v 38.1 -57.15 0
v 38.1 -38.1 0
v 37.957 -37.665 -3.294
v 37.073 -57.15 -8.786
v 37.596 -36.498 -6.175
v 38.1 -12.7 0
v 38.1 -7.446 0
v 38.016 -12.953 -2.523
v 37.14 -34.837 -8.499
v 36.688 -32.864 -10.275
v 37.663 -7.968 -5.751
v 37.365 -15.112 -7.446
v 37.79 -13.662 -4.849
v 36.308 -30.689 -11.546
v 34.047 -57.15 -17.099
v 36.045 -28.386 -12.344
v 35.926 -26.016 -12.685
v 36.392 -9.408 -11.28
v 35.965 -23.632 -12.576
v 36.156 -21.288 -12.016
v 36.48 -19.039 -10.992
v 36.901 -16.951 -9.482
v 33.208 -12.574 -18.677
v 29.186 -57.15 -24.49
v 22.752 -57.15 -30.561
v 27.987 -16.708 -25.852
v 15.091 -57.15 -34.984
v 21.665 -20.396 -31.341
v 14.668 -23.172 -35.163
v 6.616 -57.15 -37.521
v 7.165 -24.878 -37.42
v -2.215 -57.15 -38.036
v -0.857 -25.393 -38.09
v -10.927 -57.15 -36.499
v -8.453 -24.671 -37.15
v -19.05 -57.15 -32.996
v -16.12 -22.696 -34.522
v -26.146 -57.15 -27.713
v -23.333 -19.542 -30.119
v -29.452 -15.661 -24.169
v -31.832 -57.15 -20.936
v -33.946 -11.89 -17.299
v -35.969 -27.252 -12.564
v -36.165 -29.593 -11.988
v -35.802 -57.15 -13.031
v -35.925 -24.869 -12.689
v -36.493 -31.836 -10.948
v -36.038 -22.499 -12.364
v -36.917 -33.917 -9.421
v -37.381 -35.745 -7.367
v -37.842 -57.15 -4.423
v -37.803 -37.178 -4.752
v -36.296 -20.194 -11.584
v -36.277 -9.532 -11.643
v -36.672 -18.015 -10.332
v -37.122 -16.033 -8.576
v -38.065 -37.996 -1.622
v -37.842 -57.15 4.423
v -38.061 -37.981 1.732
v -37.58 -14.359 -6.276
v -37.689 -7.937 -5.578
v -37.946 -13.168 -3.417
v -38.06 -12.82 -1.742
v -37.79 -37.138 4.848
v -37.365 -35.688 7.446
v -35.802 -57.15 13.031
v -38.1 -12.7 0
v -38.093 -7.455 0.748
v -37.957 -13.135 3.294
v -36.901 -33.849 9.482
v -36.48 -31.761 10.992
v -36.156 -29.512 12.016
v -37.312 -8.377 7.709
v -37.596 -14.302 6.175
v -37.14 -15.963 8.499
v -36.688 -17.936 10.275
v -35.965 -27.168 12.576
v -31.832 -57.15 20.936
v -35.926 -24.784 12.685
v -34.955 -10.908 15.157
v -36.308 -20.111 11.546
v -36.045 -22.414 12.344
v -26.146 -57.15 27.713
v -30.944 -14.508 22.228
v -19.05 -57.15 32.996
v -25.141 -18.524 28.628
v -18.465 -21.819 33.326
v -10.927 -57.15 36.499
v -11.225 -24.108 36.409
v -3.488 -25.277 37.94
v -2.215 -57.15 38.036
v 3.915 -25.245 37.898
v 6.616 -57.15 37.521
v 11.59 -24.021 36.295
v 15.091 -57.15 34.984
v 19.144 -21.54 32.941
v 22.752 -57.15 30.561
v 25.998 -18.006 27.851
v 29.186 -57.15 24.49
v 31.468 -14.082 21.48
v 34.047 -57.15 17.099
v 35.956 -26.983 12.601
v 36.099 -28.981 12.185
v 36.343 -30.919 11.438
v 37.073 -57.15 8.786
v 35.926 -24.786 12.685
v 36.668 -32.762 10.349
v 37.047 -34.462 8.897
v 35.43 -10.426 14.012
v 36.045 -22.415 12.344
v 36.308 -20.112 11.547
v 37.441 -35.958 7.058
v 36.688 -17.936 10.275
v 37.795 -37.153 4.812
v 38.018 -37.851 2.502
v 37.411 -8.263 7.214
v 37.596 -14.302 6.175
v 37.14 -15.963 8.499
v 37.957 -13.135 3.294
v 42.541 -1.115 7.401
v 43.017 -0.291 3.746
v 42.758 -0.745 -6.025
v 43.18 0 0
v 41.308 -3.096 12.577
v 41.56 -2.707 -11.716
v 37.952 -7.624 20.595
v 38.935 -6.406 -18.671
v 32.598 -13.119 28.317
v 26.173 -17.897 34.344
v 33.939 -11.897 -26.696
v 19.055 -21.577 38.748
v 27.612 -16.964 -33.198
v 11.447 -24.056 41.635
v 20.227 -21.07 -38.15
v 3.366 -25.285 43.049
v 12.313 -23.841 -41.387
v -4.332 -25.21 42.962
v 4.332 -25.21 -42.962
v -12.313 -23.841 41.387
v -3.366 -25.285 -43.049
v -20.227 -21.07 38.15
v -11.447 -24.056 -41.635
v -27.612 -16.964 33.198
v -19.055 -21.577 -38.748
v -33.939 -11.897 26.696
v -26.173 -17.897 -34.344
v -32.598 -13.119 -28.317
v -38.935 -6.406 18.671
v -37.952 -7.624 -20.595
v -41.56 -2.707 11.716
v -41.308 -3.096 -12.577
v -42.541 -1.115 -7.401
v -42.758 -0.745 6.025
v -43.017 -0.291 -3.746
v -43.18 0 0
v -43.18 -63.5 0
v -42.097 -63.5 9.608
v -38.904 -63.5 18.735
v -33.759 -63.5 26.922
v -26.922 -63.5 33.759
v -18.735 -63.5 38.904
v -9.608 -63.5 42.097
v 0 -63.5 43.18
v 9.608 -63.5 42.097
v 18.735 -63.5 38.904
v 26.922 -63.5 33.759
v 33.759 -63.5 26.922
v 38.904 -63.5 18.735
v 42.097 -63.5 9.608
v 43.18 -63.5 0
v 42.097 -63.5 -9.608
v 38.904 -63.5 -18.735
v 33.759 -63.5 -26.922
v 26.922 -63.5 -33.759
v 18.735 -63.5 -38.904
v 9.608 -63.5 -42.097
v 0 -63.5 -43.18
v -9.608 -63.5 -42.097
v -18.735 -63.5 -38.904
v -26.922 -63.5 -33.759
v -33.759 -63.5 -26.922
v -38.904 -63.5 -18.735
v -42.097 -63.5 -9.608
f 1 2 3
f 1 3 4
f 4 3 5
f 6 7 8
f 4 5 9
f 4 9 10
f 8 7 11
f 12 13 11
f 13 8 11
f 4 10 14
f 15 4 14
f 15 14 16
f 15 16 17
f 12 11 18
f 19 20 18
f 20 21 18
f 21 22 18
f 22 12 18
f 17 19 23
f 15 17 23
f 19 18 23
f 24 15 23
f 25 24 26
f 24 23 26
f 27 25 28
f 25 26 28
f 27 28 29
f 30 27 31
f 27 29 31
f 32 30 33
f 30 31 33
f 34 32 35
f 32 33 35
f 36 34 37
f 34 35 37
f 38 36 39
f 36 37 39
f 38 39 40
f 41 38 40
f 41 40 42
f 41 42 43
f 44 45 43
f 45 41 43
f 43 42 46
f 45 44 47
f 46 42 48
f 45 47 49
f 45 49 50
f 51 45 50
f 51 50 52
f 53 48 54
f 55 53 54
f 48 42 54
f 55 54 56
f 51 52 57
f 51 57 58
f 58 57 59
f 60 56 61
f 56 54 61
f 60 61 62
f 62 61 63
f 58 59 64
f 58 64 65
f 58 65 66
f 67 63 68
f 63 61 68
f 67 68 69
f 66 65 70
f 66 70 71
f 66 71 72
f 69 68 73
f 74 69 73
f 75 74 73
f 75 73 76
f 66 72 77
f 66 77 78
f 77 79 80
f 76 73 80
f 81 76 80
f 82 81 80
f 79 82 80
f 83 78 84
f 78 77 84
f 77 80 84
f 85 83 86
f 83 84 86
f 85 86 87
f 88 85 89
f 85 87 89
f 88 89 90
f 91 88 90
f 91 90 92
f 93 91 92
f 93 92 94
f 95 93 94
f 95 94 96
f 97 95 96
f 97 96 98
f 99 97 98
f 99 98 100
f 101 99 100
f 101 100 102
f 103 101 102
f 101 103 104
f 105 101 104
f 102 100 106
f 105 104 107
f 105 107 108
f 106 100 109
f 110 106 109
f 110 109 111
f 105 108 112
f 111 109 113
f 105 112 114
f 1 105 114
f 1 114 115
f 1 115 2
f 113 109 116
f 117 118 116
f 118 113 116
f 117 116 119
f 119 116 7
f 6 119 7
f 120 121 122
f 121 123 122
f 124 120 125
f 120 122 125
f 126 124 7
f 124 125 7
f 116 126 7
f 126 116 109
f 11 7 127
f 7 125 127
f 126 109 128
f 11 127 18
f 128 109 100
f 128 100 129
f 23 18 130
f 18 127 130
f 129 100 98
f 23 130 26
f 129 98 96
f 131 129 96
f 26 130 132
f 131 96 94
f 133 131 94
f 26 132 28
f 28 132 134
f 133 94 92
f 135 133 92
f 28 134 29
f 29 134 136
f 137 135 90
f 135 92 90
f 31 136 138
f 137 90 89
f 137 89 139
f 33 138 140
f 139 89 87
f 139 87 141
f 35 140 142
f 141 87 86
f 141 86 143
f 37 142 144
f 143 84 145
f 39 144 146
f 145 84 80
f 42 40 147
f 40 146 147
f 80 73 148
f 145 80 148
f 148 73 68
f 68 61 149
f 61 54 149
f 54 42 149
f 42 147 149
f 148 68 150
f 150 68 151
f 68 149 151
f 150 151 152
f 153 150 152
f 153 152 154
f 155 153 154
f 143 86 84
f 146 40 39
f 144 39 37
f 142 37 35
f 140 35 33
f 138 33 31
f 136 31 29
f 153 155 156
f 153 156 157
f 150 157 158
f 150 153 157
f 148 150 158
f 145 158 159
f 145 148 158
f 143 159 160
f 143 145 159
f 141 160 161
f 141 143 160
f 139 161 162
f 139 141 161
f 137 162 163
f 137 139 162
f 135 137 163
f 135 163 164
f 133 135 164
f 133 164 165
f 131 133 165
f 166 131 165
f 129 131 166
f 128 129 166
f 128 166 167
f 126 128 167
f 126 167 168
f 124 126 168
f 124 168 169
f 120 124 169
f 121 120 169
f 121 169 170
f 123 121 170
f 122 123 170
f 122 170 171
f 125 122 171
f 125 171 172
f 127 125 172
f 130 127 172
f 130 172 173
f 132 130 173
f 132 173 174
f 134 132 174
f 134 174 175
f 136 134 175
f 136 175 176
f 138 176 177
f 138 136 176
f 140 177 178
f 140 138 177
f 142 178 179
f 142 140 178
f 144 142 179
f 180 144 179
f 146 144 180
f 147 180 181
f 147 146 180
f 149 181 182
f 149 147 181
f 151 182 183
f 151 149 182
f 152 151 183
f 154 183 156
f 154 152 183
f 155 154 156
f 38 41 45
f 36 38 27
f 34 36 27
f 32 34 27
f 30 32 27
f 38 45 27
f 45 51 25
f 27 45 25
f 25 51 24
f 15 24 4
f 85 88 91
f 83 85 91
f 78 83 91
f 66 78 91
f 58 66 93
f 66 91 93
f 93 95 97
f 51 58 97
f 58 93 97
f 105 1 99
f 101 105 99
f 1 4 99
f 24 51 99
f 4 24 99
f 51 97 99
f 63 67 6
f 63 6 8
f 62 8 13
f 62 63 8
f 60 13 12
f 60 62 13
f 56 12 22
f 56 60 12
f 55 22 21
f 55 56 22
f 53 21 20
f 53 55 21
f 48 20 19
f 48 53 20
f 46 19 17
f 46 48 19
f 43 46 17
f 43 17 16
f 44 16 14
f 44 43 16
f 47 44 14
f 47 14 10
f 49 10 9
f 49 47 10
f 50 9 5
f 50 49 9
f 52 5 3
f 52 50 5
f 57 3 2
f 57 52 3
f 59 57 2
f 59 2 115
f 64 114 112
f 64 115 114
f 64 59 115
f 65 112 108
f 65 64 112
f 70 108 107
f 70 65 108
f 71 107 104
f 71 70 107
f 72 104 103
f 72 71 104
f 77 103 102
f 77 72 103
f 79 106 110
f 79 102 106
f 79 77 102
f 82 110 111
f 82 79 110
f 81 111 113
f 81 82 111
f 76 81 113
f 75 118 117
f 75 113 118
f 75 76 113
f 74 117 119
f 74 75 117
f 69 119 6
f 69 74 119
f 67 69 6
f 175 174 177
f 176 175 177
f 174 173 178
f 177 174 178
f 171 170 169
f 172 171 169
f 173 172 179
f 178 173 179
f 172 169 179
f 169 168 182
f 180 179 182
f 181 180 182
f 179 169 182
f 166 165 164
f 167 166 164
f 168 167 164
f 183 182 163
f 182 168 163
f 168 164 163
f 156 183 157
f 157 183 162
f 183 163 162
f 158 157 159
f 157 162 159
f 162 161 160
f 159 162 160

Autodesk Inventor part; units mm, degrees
ref_plane "YZ Plane" through (0, 0, 0) normal (1, 0, 0) x (0, 1, 0)
sketch "Sketch1" plane through (0, 0, 0) normal (0, 1, 0) x (-1, 0, 0)
  circle A0 centre (0, 0) radius 43.18
  dimension "d0" = 86.36
extrude "Extrusion1" add sketch "Sketch1" against normal blind 63.5
sketch "Sketch2" plane through (0, 0, 0) normal (0, 0, 1) x (1, 0, 0)
  line L0 (-43.18, 0) -> (43.18, 0) projected
  arc A0 (-43.18, 0) -> (43.18, 0) centre (0, 24.003) ccw
  line L1 (-43.18, -63.5) -> (43.18, -63.5) projected
  point P0 (0, 0)
  dimension "d4" = 38.1
extrude "Extrusion2" cut sketch "Sketch2" along normal mid plane 101.6
ref_plane "Work Plane1" through (0, 0, 0) normal (0, -1, 0) x (1, 0, 0)
sketch "Sketch3" plane through (0, 0, 0) normal (0, -1, 0) x (1, 0, 0)
  circle A0 centre (0, 0) radius 38.1
  dimension "d8" = 76.2
extrude "Extrusion3" cut sketch "Sketch3" along normal blind 57.15
sketch "Sketch4" plane through (0, 0, 0) normal (1, 0, 0) x (0, 1, 0)
  circle A0 centre (-25.4, 0) radius 12.7
  point P0 (0, 0)
  dimension "d11" = 25.4
  dimension "d12" = 25.4
  dimension "d13" = 0
extrude "Extrusion4" add sketch "Sketch4" along normal mid plane 78.74
sketch "Sketch5" plane through (0, 0, 0) normal (1, 0, 0) x (0, 1, 0)
  circle A0 centre (-25.4, 0) radius 13.97
  arc A1 (-25.4, 17.145) -> (-25.4, -17.145) centre (-25.4, 0) ccw
  line L0 (-63.5, 43.18) -> (-63.5, -43.18) projected
  circle A2 centre (93.98, 0) radius 20.32
  arc A3 (90.484, -25.1583) -> (93.98, 25.4) centre (93.98, 0) ccw
  line L1 (93.98, 25.4) -> (-25.4, 17.145)
  line L2 (90.484, -25.1583) -> (-25.4, -17.145)
  point P0 (0, 0)
  point P1 (-25.4, 12.7)
  dimension "d16" = 27.94
  dimension "d17" = 34.29
  dimension "d18" = 38.1
  dimension "d19" = 43.18
  dimension "d20" = 40.64
  dimension "d21" = 0
  dimension "d22" = 119.38
  dimension "d23" = 50.8
extrude "Extrusion5" add sketch "Sketch5" along normal mid plane 31.75
sketch "Sketch6" plane through (0, 0, 0) normal (1, 0, 0) x (0, 1, 0)
  circle A0 centre (93.98, 0) radius 20.32 construction
  line L0 (93.98, 0) -> (93.98, -43.5701)
  line L1 (93.98, 0) -> (93.98, 40.9183)
  line L2 (93.98, 40.9183) -> (142.8926, 40.9183)
  line L3 (142.8926, 40.9183) -> (133.2711, -47.8298)
  line L4 (133.2711, -47.8298) -> (93.98, -43.5701)
  point P0 (0, 0)
extrude "Extrusion6" cut sketch "Sketch6" along normal mid plane 2540
ref_plane "Work Plane2" through (0, 0, -22.86) normal (0, 0, 1) x (1, 0, 0)
sketch "Sketch7" plane through (0, 0, -22.86) normal (0, 0, 1) x (1, 0, 0)
  line L0 (15.875, 90.484) -> (15.875, 93.98) projected
  line L1 (-15.875, -25.4) -> (-15.875, 93.98) construction
  line L2 (15.875, 93.98) -> (-15.875, 93.98)
  line L3 (-15.875, 93.98) -> (-15.875, 88.9)
  line L4 (-15.875, 88.9) -> (15.875, 88.9)
  line L5 (15.875, 88.9) -> (15.875, 93.98)
  point P0 (0, 0)
  dimension "d29" = 5.08
extrude "Extrusion7" add sketch "Sketch7" against normal blind 6.35
mirror "Mirror1" about plane through (0, 0, 0) normal (0, 0, 1) of "Extrusion7"
sketch "Sketch8" plane through (15.875, 0, 0) normal (1, 0, 0) x (0, 0, -1)
  circle A0 centre (0, -25.4) radius 13.97 projected
  line L0 (-20.32, 93.98) -> (-29.21, 93.98) projected
  arc A1 (-20.32, 93.98) -> (20.32, 93.98) centre (0, 93.98) ccw projected
  line L1 (20.32, 93.98) -> (29.21, 93.98) projected
  line L2 (29.21, 88.9) -> (29.21, 93.98) projected
  line L3 (25.0487, 88.9) -> (29.21, 88.9) projected
  line L4 (25.0487, 88.9) -> (17.145, -25.4) projected
  arc A2 (-17.145, -25.4) -> (17.145, -25.4) centre (0, -25.4) ccw projected
  line L5 (-17.145, -25.4) -> (-25.0487, 88.9) projected
  line L6 (-25.0487, 88.9) -> (-29.21, 88.9) projected
  line L7 (-29.21, 88.9) -> (-29.21, 93.98) projected
  point P0 (0, 0)
extrude "Extrusion8" cut sketch "Sketch8" against normal blind 38.1
properties part number "PistonsHead"
